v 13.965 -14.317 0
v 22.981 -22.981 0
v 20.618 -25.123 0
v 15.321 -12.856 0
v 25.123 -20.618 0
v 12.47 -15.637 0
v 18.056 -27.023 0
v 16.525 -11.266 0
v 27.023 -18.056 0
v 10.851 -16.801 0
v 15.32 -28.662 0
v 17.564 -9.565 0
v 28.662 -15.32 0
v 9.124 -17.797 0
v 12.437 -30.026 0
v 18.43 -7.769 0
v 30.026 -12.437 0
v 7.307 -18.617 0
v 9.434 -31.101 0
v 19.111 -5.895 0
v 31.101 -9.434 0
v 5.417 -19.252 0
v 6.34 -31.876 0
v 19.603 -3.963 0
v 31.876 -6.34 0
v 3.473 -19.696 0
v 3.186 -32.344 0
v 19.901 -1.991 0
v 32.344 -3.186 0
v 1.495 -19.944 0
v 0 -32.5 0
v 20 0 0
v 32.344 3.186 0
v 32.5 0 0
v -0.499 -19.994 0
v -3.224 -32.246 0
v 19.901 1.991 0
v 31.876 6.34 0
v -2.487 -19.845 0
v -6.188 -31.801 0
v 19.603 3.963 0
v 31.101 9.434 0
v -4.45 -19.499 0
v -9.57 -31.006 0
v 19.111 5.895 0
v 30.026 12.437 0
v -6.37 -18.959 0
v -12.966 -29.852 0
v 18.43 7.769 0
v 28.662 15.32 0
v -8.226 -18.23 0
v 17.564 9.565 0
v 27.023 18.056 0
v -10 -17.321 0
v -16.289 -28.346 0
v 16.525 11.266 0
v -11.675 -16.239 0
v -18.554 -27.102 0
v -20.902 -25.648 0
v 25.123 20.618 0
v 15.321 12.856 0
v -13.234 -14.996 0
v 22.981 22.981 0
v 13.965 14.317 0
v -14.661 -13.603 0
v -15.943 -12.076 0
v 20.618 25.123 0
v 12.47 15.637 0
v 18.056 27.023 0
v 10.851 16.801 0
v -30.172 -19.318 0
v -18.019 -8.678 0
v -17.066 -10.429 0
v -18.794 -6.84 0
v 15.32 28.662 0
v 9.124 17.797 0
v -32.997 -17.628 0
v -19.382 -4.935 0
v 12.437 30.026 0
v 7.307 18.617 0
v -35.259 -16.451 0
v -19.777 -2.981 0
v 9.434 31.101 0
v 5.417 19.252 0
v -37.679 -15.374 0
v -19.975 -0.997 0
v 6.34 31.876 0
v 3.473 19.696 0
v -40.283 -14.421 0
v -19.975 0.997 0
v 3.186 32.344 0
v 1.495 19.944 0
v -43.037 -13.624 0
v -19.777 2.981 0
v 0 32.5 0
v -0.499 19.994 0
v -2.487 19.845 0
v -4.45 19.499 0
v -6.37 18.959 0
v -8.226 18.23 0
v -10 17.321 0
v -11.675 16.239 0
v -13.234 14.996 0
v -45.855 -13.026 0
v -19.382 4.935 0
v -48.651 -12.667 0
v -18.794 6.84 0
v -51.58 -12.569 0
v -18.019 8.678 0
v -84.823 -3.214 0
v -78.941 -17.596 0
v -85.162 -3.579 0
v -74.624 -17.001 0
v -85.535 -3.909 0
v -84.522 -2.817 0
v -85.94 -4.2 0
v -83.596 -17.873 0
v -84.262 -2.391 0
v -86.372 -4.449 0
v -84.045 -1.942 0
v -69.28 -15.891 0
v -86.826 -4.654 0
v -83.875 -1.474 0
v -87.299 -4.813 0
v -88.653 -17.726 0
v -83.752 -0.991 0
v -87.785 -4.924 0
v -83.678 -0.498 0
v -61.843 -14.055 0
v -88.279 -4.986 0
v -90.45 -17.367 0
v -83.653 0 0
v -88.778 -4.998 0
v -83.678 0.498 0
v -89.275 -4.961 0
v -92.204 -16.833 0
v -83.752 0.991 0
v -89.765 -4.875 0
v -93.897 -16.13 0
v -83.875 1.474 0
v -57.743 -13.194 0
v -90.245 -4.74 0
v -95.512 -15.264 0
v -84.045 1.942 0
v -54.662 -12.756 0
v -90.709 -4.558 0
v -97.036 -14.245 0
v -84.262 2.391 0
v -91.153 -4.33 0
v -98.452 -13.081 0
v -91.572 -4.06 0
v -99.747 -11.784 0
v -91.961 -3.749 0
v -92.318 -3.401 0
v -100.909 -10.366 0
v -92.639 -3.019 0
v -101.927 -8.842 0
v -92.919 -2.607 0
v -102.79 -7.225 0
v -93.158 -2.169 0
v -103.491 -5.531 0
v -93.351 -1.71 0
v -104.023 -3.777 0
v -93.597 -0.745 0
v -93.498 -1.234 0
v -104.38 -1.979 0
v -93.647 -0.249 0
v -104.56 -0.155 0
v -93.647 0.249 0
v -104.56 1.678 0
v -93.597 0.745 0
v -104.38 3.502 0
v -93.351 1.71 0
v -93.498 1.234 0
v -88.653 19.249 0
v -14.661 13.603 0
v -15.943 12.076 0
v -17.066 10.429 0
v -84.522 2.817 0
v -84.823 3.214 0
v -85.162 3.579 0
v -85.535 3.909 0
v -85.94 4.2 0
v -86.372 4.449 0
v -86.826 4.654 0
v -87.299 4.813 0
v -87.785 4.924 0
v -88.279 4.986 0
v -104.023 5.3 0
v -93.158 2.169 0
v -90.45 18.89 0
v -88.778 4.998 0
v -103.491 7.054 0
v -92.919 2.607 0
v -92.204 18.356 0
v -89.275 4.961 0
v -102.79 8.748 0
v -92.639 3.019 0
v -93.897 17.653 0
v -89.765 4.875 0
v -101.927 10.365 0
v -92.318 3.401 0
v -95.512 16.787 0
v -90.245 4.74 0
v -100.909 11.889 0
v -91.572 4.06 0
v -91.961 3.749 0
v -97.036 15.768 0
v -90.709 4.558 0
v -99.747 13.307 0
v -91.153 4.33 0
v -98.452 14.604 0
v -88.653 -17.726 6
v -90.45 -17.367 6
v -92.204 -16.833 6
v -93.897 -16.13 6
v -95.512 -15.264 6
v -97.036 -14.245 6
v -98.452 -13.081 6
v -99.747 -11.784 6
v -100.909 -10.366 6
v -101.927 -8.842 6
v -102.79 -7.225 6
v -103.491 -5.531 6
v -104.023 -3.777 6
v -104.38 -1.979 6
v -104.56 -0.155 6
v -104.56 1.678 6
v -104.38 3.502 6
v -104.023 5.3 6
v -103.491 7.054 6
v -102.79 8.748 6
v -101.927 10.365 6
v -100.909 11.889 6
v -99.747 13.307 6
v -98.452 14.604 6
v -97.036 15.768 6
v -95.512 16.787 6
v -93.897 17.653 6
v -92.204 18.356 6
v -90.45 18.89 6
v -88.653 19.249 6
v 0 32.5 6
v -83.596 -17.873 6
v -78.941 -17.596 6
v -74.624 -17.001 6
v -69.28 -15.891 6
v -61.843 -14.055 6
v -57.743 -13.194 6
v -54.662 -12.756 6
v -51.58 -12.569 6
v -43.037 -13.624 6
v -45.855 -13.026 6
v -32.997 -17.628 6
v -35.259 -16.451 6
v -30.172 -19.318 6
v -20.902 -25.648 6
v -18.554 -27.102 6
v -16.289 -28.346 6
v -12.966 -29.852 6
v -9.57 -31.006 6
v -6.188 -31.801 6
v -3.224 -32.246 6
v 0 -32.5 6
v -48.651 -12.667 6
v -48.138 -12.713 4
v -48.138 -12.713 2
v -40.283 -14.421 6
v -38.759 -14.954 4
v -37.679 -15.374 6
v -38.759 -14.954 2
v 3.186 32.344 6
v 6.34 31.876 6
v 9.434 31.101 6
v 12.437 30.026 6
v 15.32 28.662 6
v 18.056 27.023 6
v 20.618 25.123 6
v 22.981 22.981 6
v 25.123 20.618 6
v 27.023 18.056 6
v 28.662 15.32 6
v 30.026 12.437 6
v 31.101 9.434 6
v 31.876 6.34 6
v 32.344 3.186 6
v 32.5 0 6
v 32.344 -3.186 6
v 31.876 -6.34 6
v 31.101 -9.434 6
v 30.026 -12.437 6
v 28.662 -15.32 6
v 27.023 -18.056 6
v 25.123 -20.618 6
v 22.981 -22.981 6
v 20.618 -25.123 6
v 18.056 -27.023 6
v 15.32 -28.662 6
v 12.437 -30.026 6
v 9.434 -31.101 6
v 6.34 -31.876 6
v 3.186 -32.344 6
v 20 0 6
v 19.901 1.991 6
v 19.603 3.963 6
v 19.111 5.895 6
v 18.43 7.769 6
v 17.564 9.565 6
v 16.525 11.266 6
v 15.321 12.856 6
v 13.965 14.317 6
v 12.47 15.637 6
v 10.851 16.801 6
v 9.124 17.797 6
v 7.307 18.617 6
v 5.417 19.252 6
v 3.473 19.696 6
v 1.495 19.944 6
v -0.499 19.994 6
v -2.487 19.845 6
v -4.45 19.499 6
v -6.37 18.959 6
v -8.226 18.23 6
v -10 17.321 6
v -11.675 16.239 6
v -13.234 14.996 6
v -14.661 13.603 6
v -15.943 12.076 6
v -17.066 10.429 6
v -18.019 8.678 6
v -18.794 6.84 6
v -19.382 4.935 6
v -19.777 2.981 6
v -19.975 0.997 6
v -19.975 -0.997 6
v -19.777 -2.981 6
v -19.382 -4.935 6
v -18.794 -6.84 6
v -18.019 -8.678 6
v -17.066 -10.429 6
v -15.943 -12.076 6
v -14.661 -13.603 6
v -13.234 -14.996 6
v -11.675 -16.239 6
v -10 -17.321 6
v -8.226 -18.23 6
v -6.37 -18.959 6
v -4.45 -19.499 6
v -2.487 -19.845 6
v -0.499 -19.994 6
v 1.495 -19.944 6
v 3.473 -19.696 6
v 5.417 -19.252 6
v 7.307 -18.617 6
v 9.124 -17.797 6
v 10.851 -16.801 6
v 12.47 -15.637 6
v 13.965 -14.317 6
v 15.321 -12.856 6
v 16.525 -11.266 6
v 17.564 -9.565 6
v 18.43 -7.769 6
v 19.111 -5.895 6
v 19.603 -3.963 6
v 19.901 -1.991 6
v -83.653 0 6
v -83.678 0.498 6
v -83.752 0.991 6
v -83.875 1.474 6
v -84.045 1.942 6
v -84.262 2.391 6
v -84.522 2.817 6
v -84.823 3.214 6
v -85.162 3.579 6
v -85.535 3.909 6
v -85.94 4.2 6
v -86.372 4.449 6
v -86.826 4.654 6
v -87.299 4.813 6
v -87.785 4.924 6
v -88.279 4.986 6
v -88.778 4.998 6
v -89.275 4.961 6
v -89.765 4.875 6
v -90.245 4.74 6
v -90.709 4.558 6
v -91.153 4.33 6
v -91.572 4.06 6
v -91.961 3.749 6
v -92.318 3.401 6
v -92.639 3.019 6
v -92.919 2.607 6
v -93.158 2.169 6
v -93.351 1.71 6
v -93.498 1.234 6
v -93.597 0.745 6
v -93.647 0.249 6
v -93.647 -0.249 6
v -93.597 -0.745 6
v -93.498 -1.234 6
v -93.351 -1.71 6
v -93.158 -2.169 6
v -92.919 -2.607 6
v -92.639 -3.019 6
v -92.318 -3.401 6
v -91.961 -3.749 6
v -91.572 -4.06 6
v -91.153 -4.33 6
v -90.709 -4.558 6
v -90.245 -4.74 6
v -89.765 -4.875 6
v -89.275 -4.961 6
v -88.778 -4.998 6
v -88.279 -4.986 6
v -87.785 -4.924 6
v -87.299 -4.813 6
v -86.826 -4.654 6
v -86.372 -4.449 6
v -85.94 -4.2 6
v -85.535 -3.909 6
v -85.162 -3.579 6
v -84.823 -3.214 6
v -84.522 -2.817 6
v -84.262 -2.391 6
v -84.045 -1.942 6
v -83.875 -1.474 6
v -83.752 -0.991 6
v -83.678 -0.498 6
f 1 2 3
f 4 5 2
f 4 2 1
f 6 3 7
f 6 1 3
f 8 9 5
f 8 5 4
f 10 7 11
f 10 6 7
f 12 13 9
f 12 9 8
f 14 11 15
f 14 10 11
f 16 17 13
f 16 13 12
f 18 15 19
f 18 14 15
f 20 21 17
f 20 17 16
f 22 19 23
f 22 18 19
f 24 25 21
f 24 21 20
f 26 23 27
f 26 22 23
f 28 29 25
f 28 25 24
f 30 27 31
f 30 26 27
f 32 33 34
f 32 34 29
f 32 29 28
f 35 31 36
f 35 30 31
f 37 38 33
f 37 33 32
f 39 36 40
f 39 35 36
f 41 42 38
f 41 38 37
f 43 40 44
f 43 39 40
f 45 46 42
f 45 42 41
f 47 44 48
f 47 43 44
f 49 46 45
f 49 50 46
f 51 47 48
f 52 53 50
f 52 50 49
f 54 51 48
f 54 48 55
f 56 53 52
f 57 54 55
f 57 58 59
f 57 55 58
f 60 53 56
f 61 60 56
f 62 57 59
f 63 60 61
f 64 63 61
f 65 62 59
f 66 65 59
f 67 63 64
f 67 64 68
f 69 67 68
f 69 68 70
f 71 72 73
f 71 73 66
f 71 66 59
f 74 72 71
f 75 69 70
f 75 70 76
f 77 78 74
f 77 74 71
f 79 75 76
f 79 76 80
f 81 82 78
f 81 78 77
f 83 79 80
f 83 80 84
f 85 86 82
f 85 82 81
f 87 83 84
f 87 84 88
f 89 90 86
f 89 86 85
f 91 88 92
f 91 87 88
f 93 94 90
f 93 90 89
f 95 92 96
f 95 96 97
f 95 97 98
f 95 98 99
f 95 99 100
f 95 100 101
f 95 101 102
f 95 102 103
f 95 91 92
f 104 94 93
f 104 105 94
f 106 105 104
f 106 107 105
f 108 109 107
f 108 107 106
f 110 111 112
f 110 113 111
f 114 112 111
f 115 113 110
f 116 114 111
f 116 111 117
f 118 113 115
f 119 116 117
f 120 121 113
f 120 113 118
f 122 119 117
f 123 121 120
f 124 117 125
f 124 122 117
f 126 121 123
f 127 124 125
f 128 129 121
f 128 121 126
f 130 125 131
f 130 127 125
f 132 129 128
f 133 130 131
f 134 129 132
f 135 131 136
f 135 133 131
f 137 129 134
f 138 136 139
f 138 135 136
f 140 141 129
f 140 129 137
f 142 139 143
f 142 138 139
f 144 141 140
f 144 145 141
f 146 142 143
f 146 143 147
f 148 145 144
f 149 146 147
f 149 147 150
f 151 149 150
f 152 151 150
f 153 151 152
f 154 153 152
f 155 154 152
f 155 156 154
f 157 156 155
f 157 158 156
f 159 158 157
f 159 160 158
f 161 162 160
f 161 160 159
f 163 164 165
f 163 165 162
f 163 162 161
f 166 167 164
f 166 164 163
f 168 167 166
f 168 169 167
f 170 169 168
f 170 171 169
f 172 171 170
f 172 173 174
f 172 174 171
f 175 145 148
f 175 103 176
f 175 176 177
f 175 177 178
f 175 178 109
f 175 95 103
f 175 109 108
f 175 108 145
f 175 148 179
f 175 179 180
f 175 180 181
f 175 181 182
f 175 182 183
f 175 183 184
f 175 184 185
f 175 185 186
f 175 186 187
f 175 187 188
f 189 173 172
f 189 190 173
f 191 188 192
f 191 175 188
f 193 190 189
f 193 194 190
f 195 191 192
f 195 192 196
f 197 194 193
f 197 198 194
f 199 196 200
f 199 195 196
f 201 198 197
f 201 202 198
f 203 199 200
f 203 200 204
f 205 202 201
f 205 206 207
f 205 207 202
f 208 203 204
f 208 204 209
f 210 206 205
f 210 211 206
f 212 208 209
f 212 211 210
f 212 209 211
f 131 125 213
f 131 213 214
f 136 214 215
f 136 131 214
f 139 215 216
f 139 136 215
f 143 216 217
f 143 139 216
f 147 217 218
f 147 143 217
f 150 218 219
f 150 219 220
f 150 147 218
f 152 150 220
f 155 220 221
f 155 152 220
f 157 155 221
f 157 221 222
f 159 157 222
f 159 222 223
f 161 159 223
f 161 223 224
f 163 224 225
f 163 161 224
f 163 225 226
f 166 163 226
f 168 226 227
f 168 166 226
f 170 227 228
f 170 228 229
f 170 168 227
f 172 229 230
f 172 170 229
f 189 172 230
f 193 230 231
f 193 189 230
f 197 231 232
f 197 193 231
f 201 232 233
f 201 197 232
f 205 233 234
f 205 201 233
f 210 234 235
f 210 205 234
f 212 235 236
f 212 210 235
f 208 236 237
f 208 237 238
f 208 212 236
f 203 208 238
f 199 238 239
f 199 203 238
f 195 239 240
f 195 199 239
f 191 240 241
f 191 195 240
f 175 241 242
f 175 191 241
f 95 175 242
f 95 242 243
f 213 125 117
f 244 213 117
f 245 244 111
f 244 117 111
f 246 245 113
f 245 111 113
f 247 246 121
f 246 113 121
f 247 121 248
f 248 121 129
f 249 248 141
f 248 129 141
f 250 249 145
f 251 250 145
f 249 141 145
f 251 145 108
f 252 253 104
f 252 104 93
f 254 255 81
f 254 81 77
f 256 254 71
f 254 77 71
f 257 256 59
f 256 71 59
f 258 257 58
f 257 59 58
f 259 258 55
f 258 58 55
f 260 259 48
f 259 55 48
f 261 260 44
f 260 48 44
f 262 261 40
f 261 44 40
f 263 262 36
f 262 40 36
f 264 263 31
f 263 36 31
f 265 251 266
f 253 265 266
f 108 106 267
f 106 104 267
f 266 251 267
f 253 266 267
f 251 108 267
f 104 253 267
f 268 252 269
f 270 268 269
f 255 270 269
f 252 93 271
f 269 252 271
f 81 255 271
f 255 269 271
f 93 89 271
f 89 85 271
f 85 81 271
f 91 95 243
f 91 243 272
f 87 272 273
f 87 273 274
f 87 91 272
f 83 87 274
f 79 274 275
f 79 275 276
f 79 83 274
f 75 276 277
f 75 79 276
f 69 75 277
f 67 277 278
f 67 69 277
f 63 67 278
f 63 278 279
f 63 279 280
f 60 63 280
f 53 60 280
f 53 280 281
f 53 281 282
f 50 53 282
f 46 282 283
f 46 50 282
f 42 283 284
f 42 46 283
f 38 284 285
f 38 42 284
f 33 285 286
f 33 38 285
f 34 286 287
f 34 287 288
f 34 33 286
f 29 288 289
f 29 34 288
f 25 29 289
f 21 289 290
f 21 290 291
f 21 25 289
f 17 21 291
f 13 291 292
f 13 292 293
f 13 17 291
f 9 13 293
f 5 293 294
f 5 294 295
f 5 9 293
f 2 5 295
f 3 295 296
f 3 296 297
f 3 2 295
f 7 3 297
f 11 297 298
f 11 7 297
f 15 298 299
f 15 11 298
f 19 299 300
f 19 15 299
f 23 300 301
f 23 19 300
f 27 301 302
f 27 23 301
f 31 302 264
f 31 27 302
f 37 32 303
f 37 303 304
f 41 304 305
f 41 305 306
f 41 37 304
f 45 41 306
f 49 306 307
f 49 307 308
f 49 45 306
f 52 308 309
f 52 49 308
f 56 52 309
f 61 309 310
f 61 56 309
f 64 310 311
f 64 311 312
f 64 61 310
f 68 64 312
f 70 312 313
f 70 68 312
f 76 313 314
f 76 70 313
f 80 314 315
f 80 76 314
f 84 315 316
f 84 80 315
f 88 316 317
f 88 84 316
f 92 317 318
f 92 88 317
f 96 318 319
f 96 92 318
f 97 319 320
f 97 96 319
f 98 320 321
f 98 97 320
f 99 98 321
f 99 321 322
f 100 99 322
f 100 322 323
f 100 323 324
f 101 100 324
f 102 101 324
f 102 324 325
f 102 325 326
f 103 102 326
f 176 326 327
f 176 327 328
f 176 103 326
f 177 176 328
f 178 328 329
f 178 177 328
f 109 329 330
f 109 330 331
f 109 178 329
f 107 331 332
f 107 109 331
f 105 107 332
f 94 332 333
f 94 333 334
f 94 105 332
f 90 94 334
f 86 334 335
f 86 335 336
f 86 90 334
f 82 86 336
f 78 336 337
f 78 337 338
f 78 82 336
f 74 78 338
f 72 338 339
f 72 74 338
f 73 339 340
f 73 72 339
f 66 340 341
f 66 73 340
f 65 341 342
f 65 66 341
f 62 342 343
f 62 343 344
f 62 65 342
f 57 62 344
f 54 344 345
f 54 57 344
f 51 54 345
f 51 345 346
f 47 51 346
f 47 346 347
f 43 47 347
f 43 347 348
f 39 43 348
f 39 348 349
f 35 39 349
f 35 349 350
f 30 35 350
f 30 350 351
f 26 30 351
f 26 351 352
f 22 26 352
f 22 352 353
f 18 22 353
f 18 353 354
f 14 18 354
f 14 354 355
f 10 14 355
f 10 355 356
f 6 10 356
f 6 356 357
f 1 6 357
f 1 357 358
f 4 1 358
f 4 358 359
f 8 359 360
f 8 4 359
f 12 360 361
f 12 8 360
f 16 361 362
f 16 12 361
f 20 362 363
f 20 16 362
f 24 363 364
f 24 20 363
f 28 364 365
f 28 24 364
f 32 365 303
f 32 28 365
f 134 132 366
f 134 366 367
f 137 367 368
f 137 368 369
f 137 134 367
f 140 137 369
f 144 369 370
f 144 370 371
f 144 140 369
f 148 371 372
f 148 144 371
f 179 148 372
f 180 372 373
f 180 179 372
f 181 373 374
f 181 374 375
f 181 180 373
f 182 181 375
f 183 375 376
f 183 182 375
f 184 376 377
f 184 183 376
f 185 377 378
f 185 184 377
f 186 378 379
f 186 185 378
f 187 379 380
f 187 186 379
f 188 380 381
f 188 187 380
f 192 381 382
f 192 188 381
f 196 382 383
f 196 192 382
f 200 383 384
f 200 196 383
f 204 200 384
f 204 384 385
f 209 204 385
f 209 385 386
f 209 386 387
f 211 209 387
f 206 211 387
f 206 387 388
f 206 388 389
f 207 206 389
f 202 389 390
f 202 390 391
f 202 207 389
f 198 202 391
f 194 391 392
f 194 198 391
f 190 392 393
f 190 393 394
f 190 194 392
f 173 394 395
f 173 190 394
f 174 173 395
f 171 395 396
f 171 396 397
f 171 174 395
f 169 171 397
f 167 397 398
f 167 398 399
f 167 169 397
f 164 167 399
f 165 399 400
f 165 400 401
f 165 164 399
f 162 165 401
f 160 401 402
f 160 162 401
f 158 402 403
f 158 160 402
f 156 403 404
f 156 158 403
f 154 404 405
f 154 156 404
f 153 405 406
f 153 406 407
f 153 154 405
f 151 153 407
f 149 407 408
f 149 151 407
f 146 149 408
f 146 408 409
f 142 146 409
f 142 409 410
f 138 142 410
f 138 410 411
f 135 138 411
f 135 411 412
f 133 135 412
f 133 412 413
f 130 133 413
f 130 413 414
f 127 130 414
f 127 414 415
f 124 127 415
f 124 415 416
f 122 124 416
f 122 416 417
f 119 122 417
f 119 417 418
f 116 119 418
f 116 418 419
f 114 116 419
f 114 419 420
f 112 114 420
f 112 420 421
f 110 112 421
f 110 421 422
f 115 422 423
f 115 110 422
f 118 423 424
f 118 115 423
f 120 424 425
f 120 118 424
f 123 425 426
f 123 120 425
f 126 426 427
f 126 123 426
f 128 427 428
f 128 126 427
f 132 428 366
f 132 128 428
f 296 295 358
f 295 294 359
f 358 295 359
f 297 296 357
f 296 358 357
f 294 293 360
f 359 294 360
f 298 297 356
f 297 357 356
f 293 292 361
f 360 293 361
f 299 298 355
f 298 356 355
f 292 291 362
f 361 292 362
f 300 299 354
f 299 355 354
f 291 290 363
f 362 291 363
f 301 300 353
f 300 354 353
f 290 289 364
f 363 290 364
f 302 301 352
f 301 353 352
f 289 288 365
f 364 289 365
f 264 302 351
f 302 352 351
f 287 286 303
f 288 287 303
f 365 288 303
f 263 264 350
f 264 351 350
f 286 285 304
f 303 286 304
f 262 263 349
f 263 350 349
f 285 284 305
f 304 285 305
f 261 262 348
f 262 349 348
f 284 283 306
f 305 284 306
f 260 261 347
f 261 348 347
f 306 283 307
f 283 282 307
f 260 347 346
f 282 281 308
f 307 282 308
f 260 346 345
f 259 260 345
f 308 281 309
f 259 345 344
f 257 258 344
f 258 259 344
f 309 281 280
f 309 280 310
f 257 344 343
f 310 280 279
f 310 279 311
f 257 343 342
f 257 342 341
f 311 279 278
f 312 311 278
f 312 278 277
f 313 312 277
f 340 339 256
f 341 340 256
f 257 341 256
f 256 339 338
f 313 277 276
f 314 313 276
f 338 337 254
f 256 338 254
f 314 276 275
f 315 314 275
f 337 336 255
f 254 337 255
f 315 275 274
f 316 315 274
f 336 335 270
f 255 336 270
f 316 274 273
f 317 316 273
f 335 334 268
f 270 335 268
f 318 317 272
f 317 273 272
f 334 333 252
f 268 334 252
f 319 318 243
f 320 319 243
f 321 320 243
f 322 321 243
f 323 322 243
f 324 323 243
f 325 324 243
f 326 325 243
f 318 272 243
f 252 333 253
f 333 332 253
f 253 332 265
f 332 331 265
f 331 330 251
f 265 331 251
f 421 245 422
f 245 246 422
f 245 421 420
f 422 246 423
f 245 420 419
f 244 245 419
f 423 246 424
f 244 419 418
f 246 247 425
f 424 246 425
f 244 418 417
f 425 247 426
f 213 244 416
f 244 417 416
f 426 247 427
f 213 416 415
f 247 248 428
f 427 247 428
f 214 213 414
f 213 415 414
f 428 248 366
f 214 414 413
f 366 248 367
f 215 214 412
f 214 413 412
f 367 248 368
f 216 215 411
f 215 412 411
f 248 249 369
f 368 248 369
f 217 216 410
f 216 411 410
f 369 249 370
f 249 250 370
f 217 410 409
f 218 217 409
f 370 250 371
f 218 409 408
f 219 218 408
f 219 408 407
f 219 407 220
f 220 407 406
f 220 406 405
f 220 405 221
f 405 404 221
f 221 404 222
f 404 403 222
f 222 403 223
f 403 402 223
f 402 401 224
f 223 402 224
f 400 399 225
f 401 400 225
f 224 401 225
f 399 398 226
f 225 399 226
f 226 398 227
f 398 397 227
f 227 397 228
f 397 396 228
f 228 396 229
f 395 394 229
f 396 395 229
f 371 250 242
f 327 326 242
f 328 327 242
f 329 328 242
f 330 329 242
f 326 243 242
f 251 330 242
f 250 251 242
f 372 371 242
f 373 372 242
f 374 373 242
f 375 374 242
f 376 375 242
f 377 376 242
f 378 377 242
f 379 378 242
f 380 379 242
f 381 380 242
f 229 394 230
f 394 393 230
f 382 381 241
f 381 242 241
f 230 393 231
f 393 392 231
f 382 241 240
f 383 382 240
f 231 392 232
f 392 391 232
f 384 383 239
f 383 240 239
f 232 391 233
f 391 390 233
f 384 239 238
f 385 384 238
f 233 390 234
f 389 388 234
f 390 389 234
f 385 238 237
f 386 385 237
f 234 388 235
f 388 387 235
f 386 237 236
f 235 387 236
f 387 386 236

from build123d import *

# Parameters (mm, degrees)
SKETCH_1_R      = 20
SKETCH_1_R_2    = 5
EXTRUDE_1_DEPTH = 6


with BuildPart() as part:
    # Эскиз1 → Вытянуть1 (new body)
    with BuildSketch(Plane.XY):
        with BuildLine():
            Line((-88.652848771, 19.249029144), (0, 32.5))
            ThreePointArc((0, 32.5), (32.5, 0), (0, -32.5))
            add(Edge.make_bspline(
                [(-88.652848771, -17.726099374), (-70.912657014, -19.048471367), (-58.669056624, -9.575263386), (-25.513197615, -17.946964386), (-19.385232924, -31.623438469), (0, -32.5)],
                knots=[0, 0, 0, 0, 0.412174962, 0.512174962, 1, 1, 1, 1], degree=3))
            ThreePointArc((-88.652848771, -17.726099374), (-104.582448721, 0.761464885), (-88.652848771, 19.249029144))
        make_face()
        Circle(SKETCH_1_R, mode=Mode.SUBTRACT)
        with Locations((-88.652848771, 0)):
            Circle(SKETCH_1_R_2, mode=Mode.SUBTRACT)
    extrude(amount=EXTRUDE_1_DEPTH)


solid = part.part
